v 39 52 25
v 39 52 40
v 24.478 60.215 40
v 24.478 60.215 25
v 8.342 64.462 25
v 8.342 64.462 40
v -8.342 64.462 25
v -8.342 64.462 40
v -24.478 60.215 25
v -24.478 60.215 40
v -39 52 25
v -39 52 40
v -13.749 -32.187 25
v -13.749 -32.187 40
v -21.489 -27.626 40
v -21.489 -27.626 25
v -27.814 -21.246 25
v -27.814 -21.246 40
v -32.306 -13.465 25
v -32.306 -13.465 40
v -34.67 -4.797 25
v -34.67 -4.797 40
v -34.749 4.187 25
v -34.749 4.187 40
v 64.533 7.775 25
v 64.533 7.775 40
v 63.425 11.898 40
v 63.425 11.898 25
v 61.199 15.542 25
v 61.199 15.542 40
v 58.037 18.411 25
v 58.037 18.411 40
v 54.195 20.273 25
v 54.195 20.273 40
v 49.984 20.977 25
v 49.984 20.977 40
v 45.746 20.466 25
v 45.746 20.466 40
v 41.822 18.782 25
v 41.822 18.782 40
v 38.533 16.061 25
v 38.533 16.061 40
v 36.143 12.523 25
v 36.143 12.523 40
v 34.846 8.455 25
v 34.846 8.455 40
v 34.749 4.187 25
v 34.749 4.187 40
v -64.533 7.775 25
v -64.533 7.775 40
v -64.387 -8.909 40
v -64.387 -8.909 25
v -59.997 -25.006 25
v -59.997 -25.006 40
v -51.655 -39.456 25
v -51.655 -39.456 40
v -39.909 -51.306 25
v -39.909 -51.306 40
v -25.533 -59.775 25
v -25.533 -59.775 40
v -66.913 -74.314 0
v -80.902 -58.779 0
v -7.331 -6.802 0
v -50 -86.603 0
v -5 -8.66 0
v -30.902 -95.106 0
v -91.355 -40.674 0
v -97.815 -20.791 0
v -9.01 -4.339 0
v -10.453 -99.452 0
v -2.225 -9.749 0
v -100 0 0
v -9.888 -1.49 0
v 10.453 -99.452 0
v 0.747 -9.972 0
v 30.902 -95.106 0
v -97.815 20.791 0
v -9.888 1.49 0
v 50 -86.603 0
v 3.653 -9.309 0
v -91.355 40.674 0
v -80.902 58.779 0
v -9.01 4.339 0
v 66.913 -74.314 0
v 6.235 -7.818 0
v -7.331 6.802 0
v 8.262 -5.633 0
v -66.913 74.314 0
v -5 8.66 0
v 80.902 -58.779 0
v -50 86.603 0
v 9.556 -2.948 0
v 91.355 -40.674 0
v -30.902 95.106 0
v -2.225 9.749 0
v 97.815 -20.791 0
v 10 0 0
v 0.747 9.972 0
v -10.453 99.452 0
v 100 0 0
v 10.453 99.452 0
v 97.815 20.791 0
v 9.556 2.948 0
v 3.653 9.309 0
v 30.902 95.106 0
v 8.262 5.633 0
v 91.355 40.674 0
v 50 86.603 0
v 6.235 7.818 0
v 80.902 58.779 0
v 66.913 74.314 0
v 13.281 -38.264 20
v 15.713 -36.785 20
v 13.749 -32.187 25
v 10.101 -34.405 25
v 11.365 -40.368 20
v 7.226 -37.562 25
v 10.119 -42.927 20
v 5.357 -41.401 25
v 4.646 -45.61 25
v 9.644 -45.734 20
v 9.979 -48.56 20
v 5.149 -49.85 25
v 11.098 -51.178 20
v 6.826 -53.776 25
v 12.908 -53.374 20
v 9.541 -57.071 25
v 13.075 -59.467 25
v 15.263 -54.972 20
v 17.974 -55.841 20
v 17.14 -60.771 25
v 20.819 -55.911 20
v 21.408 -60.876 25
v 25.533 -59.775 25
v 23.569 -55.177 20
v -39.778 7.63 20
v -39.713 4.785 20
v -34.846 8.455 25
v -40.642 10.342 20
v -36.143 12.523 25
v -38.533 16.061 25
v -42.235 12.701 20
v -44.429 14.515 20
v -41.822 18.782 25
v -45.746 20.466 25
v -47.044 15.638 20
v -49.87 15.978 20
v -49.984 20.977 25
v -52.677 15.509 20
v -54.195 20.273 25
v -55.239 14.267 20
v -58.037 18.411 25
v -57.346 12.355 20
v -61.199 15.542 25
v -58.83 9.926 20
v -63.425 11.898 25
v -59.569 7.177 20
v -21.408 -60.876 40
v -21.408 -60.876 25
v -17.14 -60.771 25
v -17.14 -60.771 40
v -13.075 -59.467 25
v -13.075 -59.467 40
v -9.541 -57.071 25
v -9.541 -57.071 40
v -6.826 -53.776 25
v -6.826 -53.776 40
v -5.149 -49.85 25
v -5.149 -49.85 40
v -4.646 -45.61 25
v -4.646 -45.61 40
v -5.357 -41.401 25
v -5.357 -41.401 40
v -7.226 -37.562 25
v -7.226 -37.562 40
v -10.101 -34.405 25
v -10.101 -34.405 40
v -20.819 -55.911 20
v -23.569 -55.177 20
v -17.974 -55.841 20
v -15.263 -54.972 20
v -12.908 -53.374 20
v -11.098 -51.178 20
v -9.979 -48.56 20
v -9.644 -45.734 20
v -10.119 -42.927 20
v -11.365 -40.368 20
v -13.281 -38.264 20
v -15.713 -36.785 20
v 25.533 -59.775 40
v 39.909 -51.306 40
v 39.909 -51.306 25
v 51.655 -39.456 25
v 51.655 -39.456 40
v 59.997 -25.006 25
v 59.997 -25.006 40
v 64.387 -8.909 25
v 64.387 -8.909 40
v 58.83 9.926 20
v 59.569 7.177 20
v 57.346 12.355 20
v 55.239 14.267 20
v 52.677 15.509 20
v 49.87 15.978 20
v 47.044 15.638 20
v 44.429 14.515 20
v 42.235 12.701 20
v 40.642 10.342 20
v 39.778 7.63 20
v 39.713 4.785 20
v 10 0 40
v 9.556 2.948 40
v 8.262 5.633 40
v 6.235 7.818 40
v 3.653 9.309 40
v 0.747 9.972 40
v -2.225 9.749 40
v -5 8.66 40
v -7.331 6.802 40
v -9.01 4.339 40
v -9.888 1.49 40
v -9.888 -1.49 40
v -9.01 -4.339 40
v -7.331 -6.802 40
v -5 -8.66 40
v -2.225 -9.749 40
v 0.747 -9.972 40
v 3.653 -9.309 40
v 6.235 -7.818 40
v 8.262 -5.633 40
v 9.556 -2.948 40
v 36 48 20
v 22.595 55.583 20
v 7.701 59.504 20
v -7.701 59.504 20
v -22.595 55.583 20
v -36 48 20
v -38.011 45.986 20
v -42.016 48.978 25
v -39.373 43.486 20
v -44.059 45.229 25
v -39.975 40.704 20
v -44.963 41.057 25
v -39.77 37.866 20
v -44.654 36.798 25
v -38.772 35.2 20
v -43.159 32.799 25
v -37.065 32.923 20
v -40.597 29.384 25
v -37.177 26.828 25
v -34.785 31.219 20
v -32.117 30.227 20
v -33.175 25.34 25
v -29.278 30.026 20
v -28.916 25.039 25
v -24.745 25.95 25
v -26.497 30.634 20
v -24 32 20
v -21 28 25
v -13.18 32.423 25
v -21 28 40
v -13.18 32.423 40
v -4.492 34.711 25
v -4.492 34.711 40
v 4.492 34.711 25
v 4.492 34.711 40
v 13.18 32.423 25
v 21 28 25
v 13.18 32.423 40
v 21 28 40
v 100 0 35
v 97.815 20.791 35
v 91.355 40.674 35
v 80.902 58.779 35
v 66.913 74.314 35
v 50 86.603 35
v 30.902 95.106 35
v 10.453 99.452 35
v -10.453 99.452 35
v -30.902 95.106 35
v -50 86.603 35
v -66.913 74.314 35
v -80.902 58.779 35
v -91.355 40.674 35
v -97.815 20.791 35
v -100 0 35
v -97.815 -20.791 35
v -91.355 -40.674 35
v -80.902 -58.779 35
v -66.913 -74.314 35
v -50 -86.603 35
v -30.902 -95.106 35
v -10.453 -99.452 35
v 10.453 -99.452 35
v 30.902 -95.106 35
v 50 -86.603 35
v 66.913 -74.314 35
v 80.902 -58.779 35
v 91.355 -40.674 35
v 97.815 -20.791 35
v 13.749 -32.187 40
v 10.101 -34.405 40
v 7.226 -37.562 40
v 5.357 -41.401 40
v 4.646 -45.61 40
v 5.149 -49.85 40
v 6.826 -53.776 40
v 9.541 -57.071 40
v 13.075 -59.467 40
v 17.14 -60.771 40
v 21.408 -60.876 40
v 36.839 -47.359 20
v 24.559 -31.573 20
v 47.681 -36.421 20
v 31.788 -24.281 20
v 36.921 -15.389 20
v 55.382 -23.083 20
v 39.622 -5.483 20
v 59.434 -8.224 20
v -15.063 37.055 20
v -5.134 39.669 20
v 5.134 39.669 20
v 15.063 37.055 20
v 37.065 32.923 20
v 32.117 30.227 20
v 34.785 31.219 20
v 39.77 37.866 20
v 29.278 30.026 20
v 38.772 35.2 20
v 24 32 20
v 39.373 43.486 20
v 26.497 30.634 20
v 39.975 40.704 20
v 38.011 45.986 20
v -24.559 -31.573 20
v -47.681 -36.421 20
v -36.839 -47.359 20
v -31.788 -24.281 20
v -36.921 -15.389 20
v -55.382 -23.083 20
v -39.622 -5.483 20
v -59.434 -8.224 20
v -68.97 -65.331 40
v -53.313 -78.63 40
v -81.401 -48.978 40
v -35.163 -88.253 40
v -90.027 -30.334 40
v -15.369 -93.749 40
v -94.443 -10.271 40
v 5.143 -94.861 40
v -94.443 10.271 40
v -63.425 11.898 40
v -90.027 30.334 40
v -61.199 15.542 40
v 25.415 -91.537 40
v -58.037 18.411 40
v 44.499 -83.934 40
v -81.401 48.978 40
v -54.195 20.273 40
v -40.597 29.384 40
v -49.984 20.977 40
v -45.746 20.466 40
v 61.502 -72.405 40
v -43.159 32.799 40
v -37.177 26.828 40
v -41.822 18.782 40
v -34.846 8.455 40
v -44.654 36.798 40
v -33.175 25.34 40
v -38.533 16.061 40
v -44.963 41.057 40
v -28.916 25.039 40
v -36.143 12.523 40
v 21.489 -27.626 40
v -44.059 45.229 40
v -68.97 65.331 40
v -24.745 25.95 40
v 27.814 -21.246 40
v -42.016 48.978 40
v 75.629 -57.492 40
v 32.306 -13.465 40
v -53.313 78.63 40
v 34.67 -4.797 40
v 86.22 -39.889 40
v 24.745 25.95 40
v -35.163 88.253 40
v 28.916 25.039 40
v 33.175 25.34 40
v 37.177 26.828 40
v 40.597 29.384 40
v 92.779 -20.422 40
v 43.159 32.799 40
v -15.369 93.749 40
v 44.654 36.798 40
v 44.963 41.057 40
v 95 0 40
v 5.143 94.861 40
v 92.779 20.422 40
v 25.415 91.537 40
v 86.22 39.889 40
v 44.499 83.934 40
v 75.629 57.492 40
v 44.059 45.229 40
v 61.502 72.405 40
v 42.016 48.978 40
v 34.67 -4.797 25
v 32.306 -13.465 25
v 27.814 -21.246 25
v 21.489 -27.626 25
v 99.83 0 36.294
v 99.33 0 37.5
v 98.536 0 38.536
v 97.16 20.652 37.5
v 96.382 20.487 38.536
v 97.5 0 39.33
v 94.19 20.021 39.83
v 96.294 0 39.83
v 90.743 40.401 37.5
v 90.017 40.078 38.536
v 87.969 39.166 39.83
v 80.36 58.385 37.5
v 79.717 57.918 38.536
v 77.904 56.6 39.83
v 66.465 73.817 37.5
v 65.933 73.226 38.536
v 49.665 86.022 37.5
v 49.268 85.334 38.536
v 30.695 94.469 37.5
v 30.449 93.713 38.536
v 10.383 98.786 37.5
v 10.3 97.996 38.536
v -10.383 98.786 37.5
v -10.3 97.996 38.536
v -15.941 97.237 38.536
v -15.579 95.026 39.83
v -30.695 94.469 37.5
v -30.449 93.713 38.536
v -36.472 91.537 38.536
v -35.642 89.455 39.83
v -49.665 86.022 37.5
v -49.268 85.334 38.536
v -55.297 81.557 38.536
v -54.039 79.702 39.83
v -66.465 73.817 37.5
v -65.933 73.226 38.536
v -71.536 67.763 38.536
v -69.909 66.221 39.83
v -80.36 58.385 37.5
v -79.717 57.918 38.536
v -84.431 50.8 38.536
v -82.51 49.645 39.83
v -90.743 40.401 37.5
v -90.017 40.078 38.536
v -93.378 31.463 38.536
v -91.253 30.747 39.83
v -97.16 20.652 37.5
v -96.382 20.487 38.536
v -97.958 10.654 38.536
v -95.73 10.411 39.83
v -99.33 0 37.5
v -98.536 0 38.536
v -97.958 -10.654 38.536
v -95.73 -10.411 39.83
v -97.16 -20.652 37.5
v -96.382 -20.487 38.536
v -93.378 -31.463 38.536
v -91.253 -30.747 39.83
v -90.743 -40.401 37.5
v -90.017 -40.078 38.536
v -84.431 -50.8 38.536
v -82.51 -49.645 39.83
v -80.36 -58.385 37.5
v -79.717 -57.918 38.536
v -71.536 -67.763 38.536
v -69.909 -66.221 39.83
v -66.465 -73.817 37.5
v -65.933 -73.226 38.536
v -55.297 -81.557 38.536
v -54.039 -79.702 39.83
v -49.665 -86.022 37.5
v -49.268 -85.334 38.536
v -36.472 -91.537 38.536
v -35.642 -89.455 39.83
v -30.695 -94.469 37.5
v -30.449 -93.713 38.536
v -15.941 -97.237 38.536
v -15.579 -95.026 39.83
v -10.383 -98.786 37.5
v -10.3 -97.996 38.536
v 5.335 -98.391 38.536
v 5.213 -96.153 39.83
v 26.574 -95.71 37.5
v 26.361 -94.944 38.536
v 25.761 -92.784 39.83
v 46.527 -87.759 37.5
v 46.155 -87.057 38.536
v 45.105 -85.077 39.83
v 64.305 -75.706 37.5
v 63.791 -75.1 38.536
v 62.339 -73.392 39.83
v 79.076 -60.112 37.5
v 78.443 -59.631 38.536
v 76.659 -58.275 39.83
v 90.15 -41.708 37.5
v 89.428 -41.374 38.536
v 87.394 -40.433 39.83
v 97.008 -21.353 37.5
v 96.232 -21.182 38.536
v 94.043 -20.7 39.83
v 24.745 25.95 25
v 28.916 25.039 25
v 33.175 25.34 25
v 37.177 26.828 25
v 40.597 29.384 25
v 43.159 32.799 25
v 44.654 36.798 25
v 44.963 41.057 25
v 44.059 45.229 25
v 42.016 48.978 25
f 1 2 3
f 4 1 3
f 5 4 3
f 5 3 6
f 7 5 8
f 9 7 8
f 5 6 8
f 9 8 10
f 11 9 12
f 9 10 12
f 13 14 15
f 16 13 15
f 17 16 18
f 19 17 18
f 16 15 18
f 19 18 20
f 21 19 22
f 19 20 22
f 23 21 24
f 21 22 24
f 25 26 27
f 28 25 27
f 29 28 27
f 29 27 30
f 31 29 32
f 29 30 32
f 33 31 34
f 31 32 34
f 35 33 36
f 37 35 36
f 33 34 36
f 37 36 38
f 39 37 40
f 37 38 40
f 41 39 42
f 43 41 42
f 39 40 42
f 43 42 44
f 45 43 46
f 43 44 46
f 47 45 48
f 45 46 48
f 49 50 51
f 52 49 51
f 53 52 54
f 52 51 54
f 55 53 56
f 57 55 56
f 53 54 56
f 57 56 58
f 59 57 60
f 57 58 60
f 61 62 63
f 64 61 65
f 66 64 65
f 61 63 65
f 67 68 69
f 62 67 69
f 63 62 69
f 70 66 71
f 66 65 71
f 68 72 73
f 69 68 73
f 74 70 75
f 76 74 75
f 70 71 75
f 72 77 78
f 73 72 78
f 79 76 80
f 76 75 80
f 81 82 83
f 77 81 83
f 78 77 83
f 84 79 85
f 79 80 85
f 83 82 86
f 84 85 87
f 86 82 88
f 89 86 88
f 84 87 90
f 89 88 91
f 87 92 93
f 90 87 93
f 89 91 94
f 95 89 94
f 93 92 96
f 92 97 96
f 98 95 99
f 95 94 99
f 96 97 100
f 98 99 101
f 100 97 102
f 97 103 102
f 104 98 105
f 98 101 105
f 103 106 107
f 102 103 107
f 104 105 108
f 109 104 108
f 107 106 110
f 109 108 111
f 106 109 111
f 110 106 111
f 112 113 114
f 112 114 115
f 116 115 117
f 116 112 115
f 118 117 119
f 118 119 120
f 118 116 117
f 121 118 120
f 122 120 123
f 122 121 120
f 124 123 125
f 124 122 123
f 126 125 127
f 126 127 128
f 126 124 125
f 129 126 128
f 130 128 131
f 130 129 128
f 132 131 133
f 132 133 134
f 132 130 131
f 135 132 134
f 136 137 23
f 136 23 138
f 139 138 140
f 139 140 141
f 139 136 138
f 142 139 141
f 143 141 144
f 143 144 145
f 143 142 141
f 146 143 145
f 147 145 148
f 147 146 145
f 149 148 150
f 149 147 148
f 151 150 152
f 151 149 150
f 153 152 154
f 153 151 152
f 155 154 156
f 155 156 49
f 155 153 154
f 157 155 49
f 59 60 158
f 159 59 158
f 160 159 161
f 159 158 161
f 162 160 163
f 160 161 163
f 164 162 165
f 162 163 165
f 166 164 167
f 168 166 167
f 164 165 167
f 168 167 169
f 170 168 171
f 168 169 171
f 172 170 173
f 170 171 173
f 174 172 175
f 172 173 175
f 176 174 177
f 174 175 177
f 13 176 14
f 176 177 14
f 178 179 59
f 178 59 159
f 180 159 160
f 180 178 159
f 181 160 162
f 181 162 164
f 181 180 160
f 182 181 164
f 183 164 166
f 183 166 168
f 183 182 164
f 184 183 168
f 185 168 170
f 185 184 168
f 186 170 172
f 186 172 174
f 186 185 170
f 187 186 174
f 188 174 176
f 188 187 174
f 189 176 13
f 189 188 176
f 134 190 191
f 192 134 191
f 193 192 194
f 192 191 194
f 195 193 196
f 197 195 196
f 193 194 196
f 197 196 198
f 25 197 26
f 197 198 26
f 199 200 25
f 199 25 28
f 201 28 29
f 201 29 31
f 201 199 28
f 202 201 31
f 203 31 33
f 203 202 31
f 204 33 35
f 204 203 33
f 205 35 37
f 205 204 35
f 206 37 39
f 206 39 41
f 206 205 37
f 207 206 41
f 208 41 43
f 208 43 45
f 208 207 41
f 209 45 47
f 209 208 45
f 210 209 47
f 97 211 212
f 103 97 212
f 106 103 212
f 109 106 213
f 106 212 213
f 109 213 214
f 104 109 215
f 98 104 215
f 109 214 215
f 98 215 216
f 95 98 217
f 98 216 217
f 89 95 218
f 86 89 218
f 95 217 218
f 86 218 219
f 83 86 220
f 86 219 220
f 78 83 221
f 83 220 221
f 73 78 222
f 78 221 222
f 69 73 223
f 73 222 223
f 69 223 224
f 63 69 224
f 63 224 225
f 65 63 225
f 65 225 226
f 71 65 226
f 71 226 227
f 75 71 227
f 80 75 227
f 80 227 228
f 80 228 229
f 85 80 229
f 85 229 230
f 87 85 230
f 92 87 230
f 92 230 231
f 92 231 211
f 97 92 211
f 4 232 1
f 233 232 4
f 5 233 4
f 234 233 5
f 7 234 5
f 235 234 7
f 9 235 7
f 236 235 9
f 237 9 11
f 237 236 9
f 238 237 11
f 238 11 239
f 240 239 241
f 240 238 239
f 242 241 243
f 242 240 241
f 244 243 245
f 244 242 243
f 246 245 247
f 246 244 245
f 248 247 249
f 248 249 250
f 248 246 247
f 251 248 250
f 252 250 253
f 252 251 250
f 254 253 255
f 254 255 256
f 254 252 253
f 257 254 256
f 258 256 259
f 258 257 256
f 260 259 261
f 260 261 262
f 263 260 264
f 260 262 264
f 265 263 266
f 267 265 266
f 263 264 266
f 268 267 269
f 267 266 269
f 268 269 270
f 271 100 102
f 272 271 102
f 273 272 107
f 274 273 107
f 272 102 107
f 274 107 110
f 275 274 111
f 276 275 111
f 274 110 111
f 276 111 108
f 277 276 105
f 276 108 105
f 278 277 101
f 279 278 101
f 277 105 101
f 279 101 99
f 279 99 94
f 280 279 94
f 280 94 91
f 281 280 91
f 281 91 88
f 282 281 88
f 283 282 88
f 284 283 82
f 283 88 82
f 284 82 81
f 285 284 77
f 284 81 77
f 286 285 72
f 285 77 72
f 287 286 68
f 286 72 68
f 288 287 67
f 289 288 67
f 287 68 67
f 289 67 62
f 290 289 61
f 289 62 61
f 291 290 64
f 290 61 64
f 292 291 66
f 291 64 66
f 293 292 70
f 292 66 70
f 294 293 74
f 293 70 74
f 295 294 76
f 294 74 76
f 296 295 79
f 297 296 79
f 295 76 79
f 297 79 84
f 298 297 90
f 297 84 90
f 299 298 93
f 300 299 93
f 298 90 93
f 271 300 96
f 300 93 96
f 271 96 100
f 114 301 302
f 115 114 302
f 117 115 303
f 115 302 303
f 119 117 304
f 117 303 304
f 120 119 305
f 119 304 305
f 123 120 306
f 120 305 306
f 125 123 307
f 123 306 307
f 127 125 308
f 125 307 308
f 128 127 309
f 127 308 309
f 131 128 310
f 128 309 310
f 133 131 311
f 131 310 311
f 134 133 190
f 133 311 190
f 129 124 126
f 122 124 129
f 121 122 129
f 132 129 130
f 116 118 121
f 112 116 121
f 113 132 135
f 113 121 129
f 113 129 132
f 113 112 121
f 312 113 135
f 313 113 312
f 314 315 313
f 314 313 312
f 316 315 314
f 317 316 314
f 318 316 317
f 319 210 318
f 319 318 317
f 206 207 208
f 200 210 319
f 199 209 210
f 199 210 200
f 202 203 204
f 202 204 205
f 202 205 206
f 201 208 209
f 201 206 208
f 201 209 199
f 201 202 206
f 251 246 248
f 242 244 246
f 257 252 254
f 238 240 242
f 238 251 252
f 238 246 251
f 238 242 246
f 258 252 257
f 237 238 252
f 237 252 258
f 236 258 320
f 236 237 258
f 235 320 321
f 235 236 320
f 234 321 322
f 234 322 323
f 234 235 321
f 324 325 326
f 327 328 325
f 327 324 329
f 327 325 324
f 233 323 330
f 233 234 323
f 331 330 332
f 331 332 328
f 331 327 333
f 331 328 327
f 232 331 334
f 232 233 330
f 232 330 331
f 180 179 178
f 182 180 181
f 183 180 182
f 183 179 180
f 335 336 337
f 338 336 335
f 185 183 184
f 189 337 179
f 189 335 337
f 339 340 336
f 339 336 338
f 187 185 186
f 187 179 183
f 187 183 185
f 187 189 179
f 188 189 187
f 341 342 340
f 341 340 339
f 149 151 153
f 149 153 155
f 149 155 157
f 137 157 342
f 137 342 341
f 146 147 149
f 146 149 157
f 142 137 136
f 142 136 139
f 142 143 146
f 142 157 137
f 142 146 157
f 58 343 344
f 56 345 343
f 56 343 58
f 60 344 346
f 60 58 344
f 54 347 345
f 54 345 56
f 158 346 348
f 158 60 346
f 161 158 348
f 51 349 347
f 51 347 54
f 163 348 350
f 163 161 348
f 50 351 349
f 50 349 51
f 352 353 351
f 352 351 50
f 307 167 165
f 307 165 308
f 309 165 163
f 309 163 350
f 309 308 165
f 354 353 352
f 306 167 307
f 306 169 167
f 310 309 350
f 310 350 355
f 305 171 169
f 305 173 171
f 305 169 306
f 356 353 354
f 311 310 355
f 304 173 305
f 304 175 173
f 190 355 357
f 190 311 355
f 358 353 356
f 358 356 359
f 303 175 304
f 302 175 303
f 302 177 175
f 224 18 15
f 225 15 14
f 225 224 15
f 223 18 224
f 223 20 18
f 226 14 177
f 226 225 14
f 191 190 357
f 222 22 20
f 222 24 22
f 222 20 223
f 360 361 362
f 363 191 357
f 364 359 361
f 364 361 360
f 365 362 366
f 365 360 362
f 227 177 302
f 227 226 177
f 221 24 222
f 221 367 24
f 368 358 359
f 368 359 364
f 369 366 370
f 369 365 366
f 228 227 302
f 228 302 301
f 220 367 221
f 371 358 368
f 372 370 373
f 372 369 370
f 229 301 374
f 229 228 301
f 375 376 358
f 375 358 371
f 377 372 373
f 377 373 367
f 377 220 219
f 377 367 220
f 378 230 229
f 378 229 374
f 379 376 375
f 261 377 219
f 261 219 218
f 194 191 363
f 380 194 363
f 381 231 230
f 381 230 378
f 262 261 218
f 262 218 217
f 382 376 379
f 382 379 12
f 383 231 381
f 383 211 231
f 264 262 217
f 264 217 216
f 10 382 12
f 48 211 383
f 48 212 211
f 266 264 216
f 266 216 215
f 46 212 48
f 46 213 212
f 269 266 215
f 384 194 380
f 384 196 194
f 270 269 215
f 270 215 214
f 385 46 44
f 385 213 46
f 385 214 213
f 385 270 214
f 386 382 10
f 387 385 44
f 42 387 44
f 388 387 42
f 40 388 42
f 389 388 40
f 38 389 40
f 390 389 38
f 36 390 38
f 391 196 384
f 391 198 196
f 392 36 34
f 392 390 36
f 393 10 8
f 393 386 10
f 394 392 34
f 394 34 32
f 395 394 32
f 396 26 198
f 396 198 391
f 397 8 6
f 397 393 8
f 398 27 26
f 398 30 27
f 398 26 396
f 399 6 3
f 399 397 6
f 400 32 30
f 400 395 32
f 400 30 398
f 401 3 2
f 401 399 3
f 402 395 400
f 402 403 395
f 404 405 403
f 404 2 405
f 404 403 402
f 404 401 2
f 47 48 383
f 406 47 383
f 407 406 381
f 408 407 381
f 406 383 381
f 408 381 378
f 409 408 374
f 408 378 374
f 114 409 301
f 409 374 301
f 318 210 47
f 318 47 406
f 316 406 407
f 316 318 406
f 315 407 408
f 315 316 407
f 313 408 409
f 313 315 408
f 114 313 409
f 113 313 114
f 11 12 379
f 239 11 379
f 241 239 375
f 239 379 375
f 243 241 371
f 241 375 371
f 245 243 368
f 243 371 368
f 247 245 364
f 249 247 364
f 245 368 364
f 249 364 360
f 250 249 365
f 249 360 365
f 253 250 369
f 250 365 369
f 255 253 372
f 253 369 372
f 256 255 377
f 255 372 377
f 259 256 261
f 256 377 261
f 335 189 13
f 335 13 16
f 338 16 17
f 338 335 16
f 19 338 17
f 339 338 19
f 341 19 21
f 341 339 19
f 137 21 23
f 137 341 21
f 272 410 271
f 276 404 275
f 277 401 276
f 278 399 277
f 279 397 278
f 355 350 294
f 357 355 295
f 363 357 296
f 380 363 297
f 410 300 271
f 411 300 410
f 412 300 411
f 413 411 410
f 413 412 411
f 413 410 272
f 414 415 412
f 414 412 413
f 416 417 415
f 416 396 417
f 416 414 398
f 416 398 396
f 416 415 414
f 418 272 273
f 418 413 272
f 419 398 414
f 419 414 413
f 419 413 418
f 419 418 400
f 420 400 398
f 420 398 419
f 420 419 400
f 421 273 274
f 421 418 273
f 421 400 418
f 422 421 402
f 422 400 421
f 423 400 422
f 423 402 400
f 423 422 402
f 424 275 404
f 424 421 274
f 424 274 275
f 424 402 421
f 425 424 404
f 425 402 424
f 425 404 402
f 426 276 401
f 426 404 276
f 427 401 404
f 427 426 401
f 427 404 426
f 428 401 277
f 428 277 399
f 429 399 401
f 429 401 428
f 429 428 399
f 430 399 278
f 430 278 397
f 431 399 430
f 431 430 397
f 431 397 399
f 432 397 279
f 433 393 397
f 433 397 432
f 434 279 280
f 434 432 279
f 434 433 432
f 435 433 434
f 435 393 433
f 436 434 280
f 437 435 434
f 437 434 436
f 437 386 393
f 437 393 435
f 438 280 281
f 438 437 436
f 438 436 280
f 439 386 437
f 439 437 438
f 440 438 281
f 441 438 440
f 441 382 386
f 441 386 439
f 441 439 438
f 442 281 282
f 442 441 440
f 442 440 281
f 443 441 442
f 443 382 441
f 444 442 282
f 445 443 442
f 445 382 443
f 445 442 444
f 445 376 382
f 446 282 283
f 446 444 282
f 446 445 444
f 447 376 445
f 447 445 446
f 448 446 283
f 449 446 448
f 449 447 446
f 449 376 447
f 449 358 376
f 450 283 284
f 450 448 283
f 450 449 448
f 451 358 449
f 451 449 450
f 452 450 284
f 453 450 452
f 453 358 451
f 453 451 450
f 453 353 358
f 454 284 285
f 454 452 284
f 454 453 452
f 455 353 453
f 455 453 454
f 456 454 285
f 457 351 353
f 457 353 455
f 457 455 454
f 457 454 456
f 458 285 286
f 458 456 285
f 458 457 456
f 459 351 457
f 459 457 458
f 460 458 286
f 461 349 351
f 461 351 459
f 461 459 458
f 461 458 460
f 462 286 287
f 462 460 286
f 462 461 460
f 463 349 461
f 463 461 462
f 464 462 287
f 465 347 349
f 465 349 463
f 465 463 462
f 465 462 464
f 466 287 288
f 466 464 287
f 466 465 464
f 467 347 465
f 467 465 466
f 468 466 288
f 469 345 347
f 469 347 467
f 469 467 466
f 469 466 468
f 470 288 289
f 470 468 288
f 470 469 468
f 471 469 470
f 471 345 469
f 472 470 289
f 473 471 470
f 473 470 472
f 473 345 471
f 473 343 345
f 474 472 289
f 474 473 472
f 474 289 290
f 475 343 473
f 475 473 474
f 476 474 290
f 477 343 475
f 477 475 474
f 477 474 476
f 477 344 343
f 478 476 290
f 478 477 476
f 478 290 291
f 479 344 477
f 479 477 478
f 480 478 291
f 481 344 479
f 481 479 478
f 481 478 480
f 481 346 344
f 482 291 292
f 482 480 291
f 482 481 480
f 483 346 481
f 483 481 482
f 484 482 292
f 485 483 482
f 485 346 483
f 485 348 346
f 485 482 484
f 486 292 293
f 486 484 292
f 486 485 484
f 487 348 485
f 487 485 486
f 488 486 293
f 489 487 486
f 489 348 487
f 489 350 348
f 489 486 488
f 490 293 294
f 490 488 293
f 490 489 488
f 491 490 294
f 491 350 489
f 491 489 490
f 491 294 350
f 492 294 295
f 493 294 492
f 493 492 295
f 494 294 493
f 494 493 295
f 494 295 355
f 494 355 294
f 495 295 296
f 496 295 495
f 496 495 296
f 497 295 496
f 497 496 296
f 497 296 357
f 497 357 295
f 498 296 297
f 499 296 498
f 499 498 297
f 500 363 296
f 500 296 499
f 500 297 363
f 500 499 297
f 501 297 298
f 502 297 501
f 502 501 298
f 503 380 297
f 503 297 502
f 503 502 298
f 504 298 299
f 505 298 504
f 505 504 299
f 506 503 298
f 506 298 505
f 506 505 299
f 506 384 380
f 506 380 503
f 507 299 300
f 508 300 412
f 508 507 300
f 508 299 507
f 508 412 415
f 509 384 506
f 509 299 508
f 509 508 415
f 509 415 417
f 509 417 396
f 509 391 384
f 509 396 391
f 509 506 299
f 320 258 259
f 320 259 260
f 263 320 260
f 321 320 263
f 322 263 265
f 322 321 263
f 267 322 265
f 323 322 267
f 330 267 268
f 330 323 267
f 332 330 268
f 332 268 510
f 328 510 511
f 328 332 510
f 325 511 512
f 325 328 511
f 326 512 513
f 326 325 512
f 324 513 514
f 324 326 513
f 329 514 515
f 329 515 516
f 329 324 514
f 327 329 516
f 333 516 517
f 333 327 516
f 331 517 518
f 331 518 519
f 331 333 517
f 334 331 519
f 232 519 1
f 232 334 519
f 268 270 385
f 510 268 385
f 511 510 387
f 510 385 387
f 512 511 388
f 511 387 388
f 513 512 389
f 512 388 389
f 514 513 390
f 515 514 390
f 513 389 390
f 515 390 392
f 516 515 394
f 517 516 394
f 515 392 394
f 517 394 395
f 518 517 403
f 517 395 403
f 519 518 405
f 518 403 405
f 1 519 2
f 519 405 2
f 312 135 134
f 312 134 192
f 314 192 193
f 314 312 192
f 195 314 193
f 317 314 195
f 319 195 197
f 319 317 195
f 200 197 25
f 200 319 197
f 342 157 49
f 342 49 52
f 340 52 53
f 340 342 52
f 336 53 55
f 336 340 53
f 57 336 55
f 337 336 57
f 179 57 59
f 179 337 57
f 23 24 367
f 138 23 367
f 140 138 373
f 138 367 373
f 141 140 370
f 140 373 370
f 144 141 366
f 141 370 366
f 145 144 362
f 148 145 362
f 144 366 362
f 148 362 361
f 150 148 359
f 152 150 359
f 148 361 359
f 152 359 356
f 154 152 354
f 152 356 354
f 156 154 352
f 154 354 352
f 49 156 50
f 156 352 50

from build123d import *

# Parameters (mm, degrees)
SKETCH1_R           = 100
BOSS_EXTRUDE1_DEPTH = 40
CUT_EXTRUDE2_DEPTH  = 20
FILLET1_R           = 5
CHAMFER1_SIZE       = 5
SKETCH6_R           = 10
CUT_EXTRUDE3_DEPTH  = 147.969384635


with BuildPart() as part:
    # Sketch1 → Boss-Extrude1 (new body)
    with BuildSketch(Plane.XY):
        Circle(SKETCH1_R)
    extrude(amount=BOSS_EXTRUDE1_DEPTH)

    # Sketch5 → Cut-Extrude2 (cut)
    with BuildSketch(Plane.XY.offset(40)):
        with BuildLine():
            ThreePointArc((39, 52), (0, 65), (-39, 52))
            ThreePointArc((-39, 52), (-42, 31), (-21, 28))
            ThreePointArc((-21, 28), (0, 35), (21, 28))
            ThreePointArc((21, 28), (42, 31), (39, 52))
        make_face()
        with BuildLine():
            ThreePointArc((25.533320997, -59.774990748), (56.291651246, -32.5), (64.533320997, 7.774990748))
            ThreePointArc((64.533320997, 7.774990748), (47.846787517, 20.873066959), (34.748711306, 4.186533479))
            ThreePointArc((34.748711306, 4.186533479), (30.310889132, -17.5), (13.748711306, -32.186533479))
            ThreePointArc((13.748711306, -32.186533479), (5.846787517, -51.873066959), (25.533320997, -59.774990748))
        make_face()
        with BuildLine():
            ThreePointArc((-64.533320997, 7.774990748), (-56.291651246, -32.5), (-25.533320997, -59.774990748))
            ThreePointArc((-25.533320997, -59.774990748), (-5.846787517, -51.873066959), (-13.748711306, -32.186533479))
            ThreePointArc((-13.748711306, -32.186533479), (-30.310889132, -17.5), (-34.748711306, 4.186533479))
            ThreePointArc((-34.748711306, 4.186533479), (-47.846787517, 20.873066959), (-64.533320997, 7.774990748))
        make_face()
    extrude(amount=-CUT_EXTRUDE2_DEPTH, mode=Mode.SUBTRACT)

    # Fillet1
    fillet1_edges = [part.edges().sort_by_distance(p)[0] for p in [
        (-100, 0, 40),
    ]]
    fillet(fillet1_edges, radius=FILLET1_R)

    # Chamfer1
    chamfer1_edges = [part.edges().sort_by_distance(p)[0] for p in [
        (42, 31, 20),
        (0, 35, 20),
        (-42, 31, 20),
        (0, 65, 20),
        (5.846787517, -51.873066959, 20),
        (30.310889132, -17.5, 20),
        (47.846787517, 20.873066959, 20),
        (56.291651246, -32.5, 20),
        (-47.846787517, 20.873066959, 20),
        (-30.310889132, -17.5, 20),
        (-5.846787517, -51.873066959, 20),
        (-56.291651246, -32.5, 20),
    ]]
    chamfer(chamfer1_edges, length=CHAMFER1_SIZE)

    # Sketch6 → Cut-Extrude3 (cut, through all)
    with BuildSketch(Plane.XY.offset(40)):
        Circle(SKETCH6_R)
    extrude(amount=-CUT_EXTRUDE3_DEPTH, mode=Mode.SUBTRACT)


solid = part.part
